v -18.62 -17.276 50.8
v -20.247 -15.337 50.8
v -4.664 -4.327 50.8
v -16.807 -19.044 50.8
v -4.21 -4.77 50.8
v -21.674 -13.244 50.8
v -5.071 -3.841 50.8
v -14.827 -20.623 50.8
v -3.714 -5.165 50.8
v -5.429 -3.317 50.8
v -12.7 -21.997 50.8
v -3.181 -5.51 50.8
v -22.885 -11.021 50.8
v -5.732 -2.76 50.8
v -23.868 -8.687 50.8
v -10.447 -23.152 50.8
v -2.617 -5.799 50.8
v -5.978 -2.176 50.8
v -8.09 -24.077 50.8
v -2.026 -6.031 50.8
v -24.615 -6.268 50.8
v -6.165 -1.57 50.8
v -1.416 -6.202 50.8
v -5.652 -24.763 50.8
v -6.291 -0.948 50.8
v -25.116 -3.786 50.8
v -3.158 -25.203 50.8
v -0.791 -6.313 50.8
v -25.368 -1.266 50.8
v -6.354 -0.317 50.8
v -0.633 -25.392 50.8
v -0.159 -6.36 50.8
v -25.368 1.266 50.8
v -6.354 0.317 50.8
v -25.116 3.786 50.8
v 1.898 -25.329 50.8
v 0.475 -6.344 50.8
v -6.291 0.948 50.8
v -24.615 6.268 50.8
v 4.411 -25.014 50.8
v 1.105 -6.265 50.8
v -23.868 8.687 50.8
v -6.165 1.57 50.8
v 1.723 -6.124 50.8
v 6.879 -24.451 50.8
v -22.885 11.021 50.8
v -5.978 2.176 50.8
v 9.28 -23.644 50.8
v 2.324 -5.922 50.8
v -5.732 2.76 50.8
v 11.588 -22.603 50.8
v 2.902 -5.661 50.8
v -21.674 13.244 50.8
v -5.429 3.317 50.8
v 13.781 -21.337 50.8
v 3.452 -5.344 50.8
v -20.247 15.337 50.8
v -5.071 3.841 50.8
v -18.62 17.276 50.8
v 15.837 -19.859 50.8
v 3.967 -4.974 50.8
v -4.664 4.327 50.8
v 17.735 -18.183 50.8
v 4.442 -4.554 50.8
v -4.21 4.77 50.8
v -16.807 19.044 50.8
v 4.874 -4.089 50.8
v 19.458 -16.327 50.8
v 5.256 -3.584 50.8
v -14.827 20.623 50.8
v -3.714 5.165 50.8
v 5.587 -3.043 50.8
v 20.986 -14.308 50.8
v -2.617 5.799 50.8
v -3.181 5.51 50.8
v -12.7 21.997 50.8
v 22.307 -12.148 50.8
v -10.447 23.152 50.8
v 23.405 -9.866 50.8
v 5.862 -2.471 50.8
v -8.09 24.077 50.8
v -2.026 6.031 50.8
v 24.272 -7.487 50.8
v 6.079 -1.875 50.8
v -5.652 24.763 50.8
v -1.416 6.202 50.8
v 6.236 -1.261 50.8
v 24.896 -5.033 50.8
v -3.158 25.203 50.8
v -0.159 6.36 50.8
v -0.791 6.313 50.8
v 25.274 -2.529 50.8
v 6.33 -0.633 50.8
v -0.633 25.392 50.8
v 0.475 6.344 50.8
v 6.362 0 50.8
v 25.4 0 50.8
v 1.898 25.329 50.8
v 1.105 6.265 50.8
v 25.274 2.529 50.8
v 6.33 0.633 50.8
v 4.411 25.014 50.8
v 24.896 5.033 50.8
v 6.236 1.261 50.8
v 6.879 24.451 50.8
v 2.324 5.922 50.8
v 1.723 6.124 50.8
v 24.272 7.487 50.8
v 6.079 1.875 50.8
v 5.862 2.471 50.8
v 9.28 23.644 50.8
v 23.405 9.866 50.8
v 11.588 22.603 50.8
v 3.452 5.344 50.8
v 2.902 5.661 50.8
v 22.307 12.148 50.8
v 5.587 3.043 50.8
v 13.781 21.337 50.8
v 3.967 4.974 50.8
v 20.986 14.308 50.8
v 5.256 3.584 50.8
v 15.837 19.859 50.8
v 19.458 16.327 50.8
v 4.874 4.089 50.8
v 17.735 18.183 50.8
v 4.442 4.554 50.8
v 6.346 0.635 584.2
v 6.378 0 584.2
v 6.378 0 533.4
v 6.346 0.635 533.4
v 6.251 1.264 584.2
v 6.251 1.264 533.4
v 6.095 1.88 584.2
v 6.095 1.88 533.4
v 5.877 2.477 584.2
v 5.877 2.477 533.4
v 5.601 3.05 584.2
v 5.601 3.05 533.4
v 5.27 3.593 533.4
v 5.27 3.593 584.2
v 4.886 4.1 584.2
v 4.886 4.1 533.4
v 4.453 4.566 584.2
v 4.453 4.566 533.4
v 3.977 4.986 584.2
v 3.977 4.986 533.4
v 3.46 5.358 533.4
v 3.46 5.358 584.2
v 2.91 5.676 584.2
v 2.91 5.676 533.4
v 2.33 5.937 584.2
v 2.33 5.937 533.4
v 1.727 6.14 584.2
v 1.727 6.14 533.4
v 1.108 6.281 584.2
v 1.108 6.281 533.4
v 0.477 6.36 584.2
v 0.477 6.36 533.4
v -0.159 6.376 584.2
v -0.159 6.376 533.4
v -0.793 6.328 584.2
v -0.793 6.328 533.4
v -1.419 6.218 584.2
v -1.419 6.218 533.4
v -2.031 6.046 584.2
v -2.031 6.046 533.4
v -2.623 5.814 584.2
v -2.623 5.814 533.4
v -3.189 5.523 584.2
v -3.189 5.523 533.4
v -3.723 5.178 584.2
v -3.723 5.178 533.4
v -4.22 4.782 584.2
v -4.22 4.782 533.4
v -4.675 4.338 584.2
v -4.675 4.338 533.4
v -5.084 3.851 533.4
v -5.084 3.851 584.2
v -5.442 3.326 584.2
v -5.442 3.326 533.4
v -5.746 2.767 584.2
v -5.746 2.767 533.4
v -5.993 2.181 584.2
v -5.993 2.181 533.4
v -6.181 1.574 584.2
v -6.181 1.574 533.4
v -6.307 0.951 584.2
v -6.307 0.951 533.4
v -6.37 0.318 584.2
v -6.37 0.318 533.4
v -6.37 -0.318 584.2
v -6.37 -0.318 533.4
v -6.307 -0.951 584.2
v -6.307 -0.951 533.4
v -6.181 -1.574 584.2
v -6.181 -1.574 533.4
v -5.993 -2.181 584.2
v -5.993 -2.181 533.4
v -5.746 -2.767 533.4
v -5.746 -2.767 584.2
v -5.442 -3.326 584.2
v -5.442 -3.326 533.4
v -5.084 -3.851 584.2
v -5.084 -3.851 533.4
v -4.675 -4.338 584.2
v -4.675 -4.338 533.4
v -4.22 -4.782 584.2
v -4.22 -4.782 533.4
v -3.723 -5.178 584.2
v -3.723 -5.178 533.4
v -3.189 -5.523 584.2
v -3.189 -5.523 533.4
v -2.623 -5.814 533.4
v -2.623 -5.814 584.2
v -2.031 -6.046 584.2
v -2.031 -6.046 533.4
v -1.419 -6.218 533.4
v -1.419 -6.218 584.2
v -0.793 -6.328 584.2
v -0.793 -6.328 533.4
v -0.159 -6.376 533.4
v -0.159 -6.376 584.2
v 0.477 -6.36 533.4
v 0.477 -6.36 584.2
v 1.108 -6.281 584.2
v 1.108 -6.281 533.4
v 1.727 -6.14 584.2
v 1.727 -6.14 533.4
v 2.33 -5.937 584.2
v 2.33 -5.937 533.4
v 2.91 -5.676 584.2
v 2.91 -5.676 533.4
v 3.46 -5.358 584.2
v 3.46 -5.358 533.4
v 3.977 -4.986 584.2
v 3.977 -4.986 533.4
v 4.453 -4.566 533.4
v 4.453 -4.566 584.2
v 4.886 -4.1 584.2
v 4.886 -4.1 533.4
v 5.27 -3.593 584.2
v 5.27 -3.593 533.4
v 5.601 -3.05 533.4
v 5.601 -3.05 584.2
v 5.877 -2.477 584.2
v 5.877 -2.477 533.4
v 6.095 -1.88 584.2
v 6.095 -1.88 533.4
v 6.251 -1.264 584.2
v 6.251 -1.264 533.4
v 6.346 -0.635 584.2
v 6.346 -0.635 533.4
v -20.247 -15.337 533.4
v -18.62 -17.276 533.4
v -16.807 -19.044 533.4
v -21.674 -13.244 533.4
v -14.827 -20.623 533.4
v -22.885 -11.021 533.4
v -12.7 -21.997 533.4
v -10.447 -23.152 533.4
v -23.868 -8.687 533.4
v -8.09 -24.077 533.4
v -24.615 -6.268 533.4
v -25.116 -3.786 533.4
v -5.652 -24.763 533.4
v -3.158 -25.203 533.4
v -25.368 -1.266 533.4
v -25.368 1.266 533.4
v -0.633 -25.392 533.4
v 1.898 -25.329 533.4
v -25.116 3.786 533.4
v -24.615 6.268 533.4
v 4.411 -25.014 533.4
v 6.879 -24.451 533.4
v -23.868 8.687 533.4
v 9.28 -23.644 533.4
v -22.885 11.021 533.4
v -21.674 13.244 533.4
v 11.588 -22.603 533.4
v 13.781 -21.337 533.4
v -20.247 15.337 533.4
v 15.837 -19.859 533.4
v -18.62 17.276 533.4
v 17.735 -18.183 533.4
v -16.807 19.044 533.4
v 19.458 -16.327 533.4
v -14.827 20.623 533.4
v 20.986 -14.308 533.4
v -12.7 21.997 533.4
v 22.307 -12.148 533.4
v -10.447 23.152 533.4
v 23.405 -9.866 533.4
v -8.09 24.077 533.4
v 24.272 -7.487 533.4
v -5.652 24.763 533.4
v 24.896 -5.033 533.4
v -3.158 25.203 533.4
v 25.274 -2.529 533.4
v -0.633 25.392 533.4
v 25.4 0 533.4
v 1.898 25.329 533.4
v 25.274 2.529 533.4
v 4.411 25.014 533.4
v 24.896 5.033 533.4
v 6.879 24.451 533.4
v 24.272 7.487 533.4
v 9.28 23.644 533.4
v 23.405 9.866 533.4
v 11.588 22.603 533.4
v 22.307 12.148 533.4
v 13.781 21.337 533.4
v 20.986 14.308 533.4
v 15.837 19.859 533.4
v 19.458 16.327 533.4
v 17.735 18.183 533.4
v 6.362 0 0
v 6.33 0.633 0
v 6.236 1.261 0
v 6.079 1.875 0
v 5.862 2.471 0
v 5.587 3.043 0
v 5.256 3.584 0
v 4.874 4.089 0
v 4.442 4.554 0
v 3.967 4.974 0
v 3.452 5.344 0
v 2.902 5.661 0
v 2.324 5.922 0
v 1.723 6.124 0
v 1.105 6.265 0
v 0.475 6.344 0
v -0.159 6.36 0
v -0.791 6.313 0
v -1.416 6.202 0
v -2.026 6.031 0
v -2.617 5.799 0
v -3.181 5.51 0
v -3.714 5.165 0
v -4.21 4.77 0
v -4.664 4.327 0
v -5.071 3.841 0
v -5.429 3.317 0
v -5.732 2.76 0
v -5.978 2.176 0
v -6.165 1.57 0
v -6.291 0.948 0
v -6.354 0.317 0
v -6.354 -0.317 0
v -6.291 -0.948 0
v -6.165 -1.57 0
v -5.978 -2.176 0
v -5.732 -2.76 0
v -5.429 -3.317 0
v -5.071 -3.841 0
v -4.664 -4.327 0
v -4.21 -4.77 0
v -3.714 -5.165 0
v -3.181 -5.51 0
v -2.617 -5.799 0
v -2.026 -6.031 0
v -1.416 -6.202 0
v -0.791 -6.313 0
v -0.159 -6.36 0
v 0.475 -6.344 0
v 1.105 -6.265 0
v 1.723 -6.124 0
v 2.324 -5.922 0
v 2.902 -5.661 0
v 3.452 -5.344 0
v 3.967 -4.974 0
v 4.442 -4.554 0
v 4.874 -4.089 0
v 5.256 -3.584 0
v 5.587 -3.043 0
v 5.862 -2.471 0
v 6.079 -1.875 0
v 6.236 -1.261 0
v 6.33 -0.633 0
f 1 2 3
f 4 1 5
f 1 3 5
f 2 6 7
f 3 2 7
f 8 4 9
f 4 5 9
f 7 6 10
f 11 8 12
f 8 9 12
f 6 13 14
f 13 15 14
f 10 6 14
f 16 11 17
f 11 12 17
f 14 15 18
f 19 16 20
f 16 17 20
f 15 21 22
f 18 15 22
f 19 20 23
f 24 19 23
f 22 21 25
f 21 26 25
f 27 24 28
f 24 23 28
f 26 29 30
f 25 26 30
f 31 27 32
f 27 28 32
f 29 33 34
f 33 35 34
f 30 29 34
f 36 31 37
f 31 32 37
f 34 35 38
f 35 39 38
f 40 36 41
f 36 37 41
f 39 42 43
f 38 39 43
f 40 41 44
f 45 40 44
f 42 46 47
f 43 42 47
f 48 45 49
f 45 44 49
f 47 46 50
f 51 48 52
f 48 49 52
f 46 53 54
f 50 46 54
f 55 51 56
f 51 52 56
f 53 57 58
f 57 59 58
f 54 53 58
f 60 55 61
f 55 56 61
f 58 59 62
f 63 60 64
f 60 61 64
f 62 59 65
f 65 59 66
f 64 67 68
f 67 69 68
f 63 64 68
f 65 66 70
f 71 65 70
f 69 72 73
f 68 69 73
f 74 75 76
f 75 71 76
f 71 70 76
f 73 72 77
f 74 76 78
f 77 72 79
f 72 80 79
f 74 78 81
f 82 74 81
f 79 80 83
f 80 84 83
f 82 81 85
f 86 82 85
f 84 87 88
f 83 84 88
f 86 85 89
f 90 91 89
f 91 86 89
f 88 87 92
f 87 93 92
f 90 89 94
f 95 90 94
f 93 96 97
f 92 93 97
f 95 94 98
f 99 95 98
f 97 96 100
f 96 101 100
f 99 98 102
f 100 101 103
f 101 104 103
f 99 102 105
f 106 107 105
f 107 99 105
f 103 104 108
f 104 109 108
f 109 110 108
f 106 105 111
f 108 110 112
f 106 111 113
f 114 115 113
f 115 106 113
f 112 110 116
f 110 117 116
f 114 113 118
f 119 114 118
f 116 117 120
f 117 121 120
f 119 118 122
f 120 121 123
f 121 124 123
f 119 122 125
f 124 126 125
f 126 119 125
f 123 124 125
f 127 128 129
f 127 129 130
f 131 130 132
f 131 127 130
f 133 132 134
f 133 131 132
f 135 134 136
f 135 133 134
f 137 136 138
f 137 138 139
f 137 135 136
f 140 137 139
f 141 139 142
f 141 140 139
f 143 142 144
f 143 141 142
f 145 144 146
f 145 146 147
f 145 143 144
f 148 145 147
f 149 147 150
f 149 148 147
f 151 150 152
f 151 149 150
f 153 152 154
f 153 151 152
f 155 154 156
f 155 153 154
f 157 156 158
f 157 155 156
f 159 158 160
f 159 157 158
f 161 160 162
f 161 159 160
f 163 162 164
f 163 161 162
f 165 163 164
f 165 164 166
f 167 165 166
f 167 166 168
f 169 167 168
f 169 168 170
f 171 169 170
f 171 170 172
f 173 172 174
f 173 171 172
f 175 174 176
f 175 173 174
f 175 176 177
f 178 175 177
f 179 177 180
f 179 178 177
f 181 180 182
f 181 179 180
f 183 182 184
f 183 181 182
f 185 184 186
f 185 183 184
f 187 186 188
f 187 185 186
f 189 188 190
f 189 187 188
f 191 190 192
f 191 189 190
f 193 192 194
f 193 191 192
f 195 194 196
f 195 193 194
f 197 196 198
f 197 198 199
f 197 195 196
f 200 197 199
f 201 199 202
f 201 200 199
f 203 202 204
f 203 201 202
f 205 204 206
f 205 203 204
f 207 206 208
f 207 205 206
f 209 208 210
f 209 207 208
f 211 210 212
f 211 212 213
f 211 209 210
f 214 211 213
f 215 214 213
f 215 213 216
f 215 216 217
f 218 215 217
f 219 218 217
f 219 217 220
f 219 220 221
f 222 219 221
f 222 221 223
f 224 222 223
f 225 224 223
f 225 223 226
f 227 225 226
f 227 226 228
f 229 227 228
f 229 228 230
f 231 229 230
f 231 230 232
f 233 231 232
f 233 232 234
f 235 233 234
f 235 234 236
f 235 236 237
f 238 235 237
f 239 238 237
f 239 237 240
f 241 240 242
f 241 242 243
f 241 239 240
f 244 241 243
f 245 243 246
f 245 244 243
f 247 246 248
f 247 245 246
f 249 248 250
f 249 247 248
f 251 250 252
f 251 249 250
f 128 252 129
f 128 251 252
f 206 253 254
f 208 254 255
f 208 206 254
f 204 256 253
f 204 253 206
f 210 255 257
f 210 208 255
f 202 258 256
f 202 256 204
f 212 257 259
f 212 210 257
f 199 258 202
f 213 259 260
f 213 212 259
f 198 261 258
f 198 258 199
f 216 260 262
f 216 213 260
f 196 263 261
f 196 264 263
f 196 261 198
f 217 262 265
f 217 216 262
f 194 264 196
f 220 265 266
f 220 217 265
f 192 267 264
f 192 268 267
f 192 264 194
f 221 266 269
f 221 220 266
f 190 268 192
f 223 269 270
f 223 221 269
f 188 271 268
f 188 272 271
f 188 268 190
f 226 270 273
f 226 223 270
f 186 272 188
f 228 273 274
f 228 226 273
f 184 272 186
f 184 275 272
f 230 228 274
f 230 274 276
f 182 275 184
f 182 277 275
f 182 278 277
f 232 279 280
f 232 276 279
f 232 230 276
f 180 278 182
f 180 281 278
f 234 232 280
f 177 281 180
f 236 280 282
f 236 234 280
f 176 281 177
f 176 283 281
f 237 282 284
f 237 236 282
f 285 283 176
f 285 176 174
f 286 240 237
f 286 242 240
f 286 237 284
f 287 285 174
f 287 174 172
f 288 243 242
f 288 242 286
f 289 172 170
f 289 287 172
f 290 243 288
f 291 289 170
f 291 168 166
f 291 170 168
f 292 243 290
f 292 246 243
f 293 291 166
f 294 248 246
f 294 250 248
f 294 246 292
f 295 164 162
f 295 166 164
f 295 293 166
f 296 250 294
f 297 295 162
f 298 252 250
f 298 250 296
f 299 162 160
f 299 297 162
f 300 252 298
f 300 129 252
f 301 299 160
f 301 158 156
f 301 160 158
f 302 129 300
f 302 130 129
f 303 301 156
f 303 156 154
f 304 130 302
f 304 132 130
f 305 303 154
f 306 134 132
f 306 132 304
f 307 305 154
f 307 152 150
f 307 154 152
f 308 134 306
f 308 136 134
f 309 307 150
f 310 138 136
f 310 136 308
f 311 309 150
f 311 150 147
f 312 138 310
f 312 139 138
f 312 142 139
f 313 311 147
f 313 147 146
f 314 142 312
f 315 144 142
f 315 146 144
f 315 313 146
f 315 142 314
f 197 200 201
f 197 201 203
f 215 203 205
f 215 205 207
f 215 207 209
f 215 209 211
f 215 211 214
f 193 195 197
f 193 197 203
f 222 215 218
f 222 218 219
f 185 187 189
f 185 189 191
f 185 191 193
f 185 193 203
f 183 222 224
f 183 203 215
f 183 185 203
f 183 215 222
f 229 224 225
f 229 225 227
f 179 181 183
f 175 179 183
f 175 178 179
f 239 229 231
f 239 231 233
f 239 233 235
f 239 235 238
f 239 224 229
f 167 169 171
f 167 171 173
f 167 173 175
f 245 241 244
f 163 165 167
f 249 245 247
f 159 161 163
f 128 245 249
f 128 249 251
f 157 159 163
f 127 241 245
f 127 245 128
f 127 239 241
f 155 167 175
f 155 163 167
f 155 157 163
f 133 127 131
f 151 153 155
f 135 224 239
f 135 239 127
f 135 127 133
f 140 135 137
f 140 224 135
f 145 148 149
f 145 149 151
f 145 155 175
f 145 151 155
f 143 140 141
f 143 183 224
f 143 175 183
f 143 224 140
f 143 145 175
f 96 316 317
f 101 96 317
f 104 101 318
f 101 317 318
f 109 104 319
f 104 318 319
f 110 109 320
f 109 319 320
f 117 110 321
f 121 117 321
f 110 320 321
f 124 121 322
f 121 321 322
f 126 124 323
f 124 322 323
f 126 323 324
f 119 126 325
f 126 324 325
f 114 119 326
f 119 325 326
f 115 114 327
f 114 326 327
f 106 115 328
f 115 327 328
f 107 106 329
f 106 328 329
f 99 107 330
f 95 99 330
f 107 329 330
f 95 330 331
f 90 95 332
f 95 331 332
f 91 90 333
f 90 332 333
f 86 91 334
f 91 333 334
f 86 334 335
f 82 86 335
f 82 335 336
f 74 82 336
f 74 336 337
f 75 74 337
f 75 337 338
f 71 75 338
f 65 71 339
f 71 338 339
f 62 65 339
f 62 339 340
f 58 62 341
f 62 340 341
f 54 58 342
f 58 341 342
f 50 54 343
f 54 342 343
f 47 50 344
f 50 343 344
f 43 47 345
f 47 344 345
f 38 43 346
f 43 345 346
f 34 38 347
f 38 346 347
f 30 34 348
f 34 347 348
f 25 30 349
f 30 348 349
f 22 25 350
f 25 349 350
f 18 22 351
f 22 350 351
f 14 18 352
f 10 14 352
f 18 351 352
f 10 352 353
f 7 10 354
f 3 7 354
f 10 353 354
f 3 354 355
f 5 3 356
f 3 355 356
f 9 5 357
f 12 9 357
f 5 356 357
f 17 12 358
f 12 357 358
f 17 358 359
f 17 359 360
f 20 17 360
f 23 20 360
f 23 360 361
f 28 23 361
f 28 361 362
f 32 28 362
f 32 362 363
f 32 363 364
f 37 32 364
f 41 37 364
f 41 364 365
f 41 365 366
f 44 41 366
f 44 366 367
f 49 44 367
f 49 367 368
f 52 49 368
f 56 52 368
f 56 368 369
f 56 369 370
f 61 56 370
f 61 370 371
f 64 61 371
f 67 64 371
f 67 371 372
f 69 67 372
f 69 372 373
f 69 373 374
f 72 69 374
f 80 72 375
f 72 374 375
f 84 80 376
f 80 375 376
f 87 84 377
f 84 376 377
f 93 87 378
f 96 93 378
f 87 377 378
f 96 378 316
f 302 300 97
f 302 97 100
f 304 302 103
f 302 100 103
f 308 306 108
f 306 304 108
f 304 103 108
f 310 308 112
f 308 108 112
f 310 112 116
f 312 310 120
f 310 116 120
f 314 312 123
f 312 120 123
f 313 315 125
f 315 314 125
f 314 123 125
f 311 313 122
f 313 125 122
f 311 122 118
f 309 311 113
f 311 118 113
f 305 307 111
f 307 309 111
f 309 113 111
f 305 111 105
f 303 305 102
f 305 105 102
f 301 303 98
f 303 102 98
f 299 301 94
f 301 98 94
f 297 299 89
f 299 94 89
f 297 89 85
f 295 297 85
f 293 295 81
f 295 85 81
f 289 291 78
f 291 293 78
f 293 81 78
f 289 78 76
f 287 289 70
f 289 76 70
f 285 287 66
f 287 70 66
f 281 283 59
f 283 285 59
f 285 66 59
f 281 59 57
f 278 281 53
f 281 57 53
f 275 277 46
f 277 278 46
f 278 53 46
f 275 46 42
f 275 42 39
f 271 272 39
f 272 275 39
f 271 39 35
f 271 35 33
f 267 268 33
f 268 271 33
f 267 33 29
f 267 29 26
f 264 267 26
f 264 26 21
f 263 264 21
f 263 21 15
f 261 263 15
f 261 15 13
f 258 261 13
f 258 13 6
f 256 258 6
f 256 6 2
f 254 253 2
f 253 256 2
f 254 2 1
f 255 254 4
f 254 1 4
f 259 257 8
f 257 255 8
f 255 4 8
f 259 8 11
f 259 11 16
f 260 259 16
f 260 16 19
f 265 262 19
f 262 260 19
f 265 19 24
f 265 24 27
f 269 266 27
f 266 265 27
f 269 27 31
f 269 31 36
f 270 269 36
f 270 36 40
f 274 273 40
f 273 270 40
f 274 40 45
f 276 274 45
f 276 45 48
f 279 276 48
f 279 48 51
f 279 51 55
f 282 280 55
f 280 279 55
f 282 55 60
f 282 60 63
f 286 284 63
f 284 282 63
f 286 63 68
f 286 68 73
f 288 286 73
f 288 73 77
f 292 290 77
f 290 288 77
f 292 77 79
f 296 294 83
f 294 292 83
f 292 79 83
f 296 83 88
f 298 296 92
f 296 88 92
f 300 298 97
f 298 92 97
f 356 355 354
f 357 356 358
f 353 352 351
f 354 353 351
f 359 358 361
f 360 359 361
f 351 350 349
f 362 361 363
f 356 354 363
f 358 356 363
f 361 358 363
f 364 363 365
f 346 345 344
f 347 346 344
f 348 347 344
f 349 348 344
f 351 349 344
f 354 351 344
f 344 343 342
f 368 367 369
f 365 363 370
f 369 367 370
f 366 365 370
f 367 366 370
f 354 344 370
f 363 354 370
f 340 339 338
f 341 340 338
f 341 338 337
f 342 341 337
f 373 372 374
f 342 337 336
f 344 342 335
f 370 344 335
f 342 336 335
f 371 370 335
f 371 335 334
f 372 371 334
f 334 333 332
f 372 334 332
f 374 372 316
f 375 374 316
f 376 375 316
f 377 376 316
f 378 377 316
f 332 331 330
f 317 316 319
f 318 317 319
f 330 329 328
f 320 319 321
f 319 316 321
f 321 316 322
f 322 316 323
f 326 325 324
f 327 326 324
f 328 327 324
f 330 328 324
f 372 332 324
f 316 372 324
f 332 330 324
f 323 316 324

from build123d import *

# Parameters (mm, degrees)
SKETCH1_R           = 25.4
BOSS_EXTRUDE1_DEPTH = 584.2
SKETCH2_OUTSIDE_W   = 170.52
SKETCH2_OUTSIDE_H   = 170.52
SKETCH2_OUTSIDE_R   = 6.361935525
CUT_EXTRUDE1_DEPTH  = 50.8
SKETCH5_OUTSIDE_W   = 170.52
SKETCH5_OUTSIDE_H   = 170.52
SKETCH5_OUTSIDE_R   = 6.377907631
CUT_EXTRUDE4_DEPTH  = 50.8


with BuildPart() as part:
    # Sketch1 → Boss-Extrude1 (new body)
    with BuildSketch(Plane.XY):
        Circle(SKETCH1_R)
    extrude(amount=BOSS_EXTRUDE1_DEPTH)

    # Sketch2 outside → Cut-Extrude1 (cut)
    with BuildSketch(Plane.XY):
        Rectangle(SKETCH2_OUTSIDE_W, SKETCH2_OUTSIDE_H)
        Circle(SKETCH2_OUTSIDE_R, mode=Mode.SUBTRACT)
    extrude(amount=CUT_EXTRUDE1_DEPTH, mode=Mode.SUBTRACT)

    # Sketch5 outside → Cut-Extrude4 (cut)
    with BuildSketch(Plane.XY.offset(584.2)):
        Rectangle(SKETCH5_OUTSIDE_W, SKETCH5_OUTSIDE_H)
        Circle(SKETCH5_OUTSIDE_R, mode=Mode.SUBTRACT)
    extrude(amount=-CUT_EXTRUDE4_DEPTH, mode=Mode.SUBTRACT)


solid = part.part
